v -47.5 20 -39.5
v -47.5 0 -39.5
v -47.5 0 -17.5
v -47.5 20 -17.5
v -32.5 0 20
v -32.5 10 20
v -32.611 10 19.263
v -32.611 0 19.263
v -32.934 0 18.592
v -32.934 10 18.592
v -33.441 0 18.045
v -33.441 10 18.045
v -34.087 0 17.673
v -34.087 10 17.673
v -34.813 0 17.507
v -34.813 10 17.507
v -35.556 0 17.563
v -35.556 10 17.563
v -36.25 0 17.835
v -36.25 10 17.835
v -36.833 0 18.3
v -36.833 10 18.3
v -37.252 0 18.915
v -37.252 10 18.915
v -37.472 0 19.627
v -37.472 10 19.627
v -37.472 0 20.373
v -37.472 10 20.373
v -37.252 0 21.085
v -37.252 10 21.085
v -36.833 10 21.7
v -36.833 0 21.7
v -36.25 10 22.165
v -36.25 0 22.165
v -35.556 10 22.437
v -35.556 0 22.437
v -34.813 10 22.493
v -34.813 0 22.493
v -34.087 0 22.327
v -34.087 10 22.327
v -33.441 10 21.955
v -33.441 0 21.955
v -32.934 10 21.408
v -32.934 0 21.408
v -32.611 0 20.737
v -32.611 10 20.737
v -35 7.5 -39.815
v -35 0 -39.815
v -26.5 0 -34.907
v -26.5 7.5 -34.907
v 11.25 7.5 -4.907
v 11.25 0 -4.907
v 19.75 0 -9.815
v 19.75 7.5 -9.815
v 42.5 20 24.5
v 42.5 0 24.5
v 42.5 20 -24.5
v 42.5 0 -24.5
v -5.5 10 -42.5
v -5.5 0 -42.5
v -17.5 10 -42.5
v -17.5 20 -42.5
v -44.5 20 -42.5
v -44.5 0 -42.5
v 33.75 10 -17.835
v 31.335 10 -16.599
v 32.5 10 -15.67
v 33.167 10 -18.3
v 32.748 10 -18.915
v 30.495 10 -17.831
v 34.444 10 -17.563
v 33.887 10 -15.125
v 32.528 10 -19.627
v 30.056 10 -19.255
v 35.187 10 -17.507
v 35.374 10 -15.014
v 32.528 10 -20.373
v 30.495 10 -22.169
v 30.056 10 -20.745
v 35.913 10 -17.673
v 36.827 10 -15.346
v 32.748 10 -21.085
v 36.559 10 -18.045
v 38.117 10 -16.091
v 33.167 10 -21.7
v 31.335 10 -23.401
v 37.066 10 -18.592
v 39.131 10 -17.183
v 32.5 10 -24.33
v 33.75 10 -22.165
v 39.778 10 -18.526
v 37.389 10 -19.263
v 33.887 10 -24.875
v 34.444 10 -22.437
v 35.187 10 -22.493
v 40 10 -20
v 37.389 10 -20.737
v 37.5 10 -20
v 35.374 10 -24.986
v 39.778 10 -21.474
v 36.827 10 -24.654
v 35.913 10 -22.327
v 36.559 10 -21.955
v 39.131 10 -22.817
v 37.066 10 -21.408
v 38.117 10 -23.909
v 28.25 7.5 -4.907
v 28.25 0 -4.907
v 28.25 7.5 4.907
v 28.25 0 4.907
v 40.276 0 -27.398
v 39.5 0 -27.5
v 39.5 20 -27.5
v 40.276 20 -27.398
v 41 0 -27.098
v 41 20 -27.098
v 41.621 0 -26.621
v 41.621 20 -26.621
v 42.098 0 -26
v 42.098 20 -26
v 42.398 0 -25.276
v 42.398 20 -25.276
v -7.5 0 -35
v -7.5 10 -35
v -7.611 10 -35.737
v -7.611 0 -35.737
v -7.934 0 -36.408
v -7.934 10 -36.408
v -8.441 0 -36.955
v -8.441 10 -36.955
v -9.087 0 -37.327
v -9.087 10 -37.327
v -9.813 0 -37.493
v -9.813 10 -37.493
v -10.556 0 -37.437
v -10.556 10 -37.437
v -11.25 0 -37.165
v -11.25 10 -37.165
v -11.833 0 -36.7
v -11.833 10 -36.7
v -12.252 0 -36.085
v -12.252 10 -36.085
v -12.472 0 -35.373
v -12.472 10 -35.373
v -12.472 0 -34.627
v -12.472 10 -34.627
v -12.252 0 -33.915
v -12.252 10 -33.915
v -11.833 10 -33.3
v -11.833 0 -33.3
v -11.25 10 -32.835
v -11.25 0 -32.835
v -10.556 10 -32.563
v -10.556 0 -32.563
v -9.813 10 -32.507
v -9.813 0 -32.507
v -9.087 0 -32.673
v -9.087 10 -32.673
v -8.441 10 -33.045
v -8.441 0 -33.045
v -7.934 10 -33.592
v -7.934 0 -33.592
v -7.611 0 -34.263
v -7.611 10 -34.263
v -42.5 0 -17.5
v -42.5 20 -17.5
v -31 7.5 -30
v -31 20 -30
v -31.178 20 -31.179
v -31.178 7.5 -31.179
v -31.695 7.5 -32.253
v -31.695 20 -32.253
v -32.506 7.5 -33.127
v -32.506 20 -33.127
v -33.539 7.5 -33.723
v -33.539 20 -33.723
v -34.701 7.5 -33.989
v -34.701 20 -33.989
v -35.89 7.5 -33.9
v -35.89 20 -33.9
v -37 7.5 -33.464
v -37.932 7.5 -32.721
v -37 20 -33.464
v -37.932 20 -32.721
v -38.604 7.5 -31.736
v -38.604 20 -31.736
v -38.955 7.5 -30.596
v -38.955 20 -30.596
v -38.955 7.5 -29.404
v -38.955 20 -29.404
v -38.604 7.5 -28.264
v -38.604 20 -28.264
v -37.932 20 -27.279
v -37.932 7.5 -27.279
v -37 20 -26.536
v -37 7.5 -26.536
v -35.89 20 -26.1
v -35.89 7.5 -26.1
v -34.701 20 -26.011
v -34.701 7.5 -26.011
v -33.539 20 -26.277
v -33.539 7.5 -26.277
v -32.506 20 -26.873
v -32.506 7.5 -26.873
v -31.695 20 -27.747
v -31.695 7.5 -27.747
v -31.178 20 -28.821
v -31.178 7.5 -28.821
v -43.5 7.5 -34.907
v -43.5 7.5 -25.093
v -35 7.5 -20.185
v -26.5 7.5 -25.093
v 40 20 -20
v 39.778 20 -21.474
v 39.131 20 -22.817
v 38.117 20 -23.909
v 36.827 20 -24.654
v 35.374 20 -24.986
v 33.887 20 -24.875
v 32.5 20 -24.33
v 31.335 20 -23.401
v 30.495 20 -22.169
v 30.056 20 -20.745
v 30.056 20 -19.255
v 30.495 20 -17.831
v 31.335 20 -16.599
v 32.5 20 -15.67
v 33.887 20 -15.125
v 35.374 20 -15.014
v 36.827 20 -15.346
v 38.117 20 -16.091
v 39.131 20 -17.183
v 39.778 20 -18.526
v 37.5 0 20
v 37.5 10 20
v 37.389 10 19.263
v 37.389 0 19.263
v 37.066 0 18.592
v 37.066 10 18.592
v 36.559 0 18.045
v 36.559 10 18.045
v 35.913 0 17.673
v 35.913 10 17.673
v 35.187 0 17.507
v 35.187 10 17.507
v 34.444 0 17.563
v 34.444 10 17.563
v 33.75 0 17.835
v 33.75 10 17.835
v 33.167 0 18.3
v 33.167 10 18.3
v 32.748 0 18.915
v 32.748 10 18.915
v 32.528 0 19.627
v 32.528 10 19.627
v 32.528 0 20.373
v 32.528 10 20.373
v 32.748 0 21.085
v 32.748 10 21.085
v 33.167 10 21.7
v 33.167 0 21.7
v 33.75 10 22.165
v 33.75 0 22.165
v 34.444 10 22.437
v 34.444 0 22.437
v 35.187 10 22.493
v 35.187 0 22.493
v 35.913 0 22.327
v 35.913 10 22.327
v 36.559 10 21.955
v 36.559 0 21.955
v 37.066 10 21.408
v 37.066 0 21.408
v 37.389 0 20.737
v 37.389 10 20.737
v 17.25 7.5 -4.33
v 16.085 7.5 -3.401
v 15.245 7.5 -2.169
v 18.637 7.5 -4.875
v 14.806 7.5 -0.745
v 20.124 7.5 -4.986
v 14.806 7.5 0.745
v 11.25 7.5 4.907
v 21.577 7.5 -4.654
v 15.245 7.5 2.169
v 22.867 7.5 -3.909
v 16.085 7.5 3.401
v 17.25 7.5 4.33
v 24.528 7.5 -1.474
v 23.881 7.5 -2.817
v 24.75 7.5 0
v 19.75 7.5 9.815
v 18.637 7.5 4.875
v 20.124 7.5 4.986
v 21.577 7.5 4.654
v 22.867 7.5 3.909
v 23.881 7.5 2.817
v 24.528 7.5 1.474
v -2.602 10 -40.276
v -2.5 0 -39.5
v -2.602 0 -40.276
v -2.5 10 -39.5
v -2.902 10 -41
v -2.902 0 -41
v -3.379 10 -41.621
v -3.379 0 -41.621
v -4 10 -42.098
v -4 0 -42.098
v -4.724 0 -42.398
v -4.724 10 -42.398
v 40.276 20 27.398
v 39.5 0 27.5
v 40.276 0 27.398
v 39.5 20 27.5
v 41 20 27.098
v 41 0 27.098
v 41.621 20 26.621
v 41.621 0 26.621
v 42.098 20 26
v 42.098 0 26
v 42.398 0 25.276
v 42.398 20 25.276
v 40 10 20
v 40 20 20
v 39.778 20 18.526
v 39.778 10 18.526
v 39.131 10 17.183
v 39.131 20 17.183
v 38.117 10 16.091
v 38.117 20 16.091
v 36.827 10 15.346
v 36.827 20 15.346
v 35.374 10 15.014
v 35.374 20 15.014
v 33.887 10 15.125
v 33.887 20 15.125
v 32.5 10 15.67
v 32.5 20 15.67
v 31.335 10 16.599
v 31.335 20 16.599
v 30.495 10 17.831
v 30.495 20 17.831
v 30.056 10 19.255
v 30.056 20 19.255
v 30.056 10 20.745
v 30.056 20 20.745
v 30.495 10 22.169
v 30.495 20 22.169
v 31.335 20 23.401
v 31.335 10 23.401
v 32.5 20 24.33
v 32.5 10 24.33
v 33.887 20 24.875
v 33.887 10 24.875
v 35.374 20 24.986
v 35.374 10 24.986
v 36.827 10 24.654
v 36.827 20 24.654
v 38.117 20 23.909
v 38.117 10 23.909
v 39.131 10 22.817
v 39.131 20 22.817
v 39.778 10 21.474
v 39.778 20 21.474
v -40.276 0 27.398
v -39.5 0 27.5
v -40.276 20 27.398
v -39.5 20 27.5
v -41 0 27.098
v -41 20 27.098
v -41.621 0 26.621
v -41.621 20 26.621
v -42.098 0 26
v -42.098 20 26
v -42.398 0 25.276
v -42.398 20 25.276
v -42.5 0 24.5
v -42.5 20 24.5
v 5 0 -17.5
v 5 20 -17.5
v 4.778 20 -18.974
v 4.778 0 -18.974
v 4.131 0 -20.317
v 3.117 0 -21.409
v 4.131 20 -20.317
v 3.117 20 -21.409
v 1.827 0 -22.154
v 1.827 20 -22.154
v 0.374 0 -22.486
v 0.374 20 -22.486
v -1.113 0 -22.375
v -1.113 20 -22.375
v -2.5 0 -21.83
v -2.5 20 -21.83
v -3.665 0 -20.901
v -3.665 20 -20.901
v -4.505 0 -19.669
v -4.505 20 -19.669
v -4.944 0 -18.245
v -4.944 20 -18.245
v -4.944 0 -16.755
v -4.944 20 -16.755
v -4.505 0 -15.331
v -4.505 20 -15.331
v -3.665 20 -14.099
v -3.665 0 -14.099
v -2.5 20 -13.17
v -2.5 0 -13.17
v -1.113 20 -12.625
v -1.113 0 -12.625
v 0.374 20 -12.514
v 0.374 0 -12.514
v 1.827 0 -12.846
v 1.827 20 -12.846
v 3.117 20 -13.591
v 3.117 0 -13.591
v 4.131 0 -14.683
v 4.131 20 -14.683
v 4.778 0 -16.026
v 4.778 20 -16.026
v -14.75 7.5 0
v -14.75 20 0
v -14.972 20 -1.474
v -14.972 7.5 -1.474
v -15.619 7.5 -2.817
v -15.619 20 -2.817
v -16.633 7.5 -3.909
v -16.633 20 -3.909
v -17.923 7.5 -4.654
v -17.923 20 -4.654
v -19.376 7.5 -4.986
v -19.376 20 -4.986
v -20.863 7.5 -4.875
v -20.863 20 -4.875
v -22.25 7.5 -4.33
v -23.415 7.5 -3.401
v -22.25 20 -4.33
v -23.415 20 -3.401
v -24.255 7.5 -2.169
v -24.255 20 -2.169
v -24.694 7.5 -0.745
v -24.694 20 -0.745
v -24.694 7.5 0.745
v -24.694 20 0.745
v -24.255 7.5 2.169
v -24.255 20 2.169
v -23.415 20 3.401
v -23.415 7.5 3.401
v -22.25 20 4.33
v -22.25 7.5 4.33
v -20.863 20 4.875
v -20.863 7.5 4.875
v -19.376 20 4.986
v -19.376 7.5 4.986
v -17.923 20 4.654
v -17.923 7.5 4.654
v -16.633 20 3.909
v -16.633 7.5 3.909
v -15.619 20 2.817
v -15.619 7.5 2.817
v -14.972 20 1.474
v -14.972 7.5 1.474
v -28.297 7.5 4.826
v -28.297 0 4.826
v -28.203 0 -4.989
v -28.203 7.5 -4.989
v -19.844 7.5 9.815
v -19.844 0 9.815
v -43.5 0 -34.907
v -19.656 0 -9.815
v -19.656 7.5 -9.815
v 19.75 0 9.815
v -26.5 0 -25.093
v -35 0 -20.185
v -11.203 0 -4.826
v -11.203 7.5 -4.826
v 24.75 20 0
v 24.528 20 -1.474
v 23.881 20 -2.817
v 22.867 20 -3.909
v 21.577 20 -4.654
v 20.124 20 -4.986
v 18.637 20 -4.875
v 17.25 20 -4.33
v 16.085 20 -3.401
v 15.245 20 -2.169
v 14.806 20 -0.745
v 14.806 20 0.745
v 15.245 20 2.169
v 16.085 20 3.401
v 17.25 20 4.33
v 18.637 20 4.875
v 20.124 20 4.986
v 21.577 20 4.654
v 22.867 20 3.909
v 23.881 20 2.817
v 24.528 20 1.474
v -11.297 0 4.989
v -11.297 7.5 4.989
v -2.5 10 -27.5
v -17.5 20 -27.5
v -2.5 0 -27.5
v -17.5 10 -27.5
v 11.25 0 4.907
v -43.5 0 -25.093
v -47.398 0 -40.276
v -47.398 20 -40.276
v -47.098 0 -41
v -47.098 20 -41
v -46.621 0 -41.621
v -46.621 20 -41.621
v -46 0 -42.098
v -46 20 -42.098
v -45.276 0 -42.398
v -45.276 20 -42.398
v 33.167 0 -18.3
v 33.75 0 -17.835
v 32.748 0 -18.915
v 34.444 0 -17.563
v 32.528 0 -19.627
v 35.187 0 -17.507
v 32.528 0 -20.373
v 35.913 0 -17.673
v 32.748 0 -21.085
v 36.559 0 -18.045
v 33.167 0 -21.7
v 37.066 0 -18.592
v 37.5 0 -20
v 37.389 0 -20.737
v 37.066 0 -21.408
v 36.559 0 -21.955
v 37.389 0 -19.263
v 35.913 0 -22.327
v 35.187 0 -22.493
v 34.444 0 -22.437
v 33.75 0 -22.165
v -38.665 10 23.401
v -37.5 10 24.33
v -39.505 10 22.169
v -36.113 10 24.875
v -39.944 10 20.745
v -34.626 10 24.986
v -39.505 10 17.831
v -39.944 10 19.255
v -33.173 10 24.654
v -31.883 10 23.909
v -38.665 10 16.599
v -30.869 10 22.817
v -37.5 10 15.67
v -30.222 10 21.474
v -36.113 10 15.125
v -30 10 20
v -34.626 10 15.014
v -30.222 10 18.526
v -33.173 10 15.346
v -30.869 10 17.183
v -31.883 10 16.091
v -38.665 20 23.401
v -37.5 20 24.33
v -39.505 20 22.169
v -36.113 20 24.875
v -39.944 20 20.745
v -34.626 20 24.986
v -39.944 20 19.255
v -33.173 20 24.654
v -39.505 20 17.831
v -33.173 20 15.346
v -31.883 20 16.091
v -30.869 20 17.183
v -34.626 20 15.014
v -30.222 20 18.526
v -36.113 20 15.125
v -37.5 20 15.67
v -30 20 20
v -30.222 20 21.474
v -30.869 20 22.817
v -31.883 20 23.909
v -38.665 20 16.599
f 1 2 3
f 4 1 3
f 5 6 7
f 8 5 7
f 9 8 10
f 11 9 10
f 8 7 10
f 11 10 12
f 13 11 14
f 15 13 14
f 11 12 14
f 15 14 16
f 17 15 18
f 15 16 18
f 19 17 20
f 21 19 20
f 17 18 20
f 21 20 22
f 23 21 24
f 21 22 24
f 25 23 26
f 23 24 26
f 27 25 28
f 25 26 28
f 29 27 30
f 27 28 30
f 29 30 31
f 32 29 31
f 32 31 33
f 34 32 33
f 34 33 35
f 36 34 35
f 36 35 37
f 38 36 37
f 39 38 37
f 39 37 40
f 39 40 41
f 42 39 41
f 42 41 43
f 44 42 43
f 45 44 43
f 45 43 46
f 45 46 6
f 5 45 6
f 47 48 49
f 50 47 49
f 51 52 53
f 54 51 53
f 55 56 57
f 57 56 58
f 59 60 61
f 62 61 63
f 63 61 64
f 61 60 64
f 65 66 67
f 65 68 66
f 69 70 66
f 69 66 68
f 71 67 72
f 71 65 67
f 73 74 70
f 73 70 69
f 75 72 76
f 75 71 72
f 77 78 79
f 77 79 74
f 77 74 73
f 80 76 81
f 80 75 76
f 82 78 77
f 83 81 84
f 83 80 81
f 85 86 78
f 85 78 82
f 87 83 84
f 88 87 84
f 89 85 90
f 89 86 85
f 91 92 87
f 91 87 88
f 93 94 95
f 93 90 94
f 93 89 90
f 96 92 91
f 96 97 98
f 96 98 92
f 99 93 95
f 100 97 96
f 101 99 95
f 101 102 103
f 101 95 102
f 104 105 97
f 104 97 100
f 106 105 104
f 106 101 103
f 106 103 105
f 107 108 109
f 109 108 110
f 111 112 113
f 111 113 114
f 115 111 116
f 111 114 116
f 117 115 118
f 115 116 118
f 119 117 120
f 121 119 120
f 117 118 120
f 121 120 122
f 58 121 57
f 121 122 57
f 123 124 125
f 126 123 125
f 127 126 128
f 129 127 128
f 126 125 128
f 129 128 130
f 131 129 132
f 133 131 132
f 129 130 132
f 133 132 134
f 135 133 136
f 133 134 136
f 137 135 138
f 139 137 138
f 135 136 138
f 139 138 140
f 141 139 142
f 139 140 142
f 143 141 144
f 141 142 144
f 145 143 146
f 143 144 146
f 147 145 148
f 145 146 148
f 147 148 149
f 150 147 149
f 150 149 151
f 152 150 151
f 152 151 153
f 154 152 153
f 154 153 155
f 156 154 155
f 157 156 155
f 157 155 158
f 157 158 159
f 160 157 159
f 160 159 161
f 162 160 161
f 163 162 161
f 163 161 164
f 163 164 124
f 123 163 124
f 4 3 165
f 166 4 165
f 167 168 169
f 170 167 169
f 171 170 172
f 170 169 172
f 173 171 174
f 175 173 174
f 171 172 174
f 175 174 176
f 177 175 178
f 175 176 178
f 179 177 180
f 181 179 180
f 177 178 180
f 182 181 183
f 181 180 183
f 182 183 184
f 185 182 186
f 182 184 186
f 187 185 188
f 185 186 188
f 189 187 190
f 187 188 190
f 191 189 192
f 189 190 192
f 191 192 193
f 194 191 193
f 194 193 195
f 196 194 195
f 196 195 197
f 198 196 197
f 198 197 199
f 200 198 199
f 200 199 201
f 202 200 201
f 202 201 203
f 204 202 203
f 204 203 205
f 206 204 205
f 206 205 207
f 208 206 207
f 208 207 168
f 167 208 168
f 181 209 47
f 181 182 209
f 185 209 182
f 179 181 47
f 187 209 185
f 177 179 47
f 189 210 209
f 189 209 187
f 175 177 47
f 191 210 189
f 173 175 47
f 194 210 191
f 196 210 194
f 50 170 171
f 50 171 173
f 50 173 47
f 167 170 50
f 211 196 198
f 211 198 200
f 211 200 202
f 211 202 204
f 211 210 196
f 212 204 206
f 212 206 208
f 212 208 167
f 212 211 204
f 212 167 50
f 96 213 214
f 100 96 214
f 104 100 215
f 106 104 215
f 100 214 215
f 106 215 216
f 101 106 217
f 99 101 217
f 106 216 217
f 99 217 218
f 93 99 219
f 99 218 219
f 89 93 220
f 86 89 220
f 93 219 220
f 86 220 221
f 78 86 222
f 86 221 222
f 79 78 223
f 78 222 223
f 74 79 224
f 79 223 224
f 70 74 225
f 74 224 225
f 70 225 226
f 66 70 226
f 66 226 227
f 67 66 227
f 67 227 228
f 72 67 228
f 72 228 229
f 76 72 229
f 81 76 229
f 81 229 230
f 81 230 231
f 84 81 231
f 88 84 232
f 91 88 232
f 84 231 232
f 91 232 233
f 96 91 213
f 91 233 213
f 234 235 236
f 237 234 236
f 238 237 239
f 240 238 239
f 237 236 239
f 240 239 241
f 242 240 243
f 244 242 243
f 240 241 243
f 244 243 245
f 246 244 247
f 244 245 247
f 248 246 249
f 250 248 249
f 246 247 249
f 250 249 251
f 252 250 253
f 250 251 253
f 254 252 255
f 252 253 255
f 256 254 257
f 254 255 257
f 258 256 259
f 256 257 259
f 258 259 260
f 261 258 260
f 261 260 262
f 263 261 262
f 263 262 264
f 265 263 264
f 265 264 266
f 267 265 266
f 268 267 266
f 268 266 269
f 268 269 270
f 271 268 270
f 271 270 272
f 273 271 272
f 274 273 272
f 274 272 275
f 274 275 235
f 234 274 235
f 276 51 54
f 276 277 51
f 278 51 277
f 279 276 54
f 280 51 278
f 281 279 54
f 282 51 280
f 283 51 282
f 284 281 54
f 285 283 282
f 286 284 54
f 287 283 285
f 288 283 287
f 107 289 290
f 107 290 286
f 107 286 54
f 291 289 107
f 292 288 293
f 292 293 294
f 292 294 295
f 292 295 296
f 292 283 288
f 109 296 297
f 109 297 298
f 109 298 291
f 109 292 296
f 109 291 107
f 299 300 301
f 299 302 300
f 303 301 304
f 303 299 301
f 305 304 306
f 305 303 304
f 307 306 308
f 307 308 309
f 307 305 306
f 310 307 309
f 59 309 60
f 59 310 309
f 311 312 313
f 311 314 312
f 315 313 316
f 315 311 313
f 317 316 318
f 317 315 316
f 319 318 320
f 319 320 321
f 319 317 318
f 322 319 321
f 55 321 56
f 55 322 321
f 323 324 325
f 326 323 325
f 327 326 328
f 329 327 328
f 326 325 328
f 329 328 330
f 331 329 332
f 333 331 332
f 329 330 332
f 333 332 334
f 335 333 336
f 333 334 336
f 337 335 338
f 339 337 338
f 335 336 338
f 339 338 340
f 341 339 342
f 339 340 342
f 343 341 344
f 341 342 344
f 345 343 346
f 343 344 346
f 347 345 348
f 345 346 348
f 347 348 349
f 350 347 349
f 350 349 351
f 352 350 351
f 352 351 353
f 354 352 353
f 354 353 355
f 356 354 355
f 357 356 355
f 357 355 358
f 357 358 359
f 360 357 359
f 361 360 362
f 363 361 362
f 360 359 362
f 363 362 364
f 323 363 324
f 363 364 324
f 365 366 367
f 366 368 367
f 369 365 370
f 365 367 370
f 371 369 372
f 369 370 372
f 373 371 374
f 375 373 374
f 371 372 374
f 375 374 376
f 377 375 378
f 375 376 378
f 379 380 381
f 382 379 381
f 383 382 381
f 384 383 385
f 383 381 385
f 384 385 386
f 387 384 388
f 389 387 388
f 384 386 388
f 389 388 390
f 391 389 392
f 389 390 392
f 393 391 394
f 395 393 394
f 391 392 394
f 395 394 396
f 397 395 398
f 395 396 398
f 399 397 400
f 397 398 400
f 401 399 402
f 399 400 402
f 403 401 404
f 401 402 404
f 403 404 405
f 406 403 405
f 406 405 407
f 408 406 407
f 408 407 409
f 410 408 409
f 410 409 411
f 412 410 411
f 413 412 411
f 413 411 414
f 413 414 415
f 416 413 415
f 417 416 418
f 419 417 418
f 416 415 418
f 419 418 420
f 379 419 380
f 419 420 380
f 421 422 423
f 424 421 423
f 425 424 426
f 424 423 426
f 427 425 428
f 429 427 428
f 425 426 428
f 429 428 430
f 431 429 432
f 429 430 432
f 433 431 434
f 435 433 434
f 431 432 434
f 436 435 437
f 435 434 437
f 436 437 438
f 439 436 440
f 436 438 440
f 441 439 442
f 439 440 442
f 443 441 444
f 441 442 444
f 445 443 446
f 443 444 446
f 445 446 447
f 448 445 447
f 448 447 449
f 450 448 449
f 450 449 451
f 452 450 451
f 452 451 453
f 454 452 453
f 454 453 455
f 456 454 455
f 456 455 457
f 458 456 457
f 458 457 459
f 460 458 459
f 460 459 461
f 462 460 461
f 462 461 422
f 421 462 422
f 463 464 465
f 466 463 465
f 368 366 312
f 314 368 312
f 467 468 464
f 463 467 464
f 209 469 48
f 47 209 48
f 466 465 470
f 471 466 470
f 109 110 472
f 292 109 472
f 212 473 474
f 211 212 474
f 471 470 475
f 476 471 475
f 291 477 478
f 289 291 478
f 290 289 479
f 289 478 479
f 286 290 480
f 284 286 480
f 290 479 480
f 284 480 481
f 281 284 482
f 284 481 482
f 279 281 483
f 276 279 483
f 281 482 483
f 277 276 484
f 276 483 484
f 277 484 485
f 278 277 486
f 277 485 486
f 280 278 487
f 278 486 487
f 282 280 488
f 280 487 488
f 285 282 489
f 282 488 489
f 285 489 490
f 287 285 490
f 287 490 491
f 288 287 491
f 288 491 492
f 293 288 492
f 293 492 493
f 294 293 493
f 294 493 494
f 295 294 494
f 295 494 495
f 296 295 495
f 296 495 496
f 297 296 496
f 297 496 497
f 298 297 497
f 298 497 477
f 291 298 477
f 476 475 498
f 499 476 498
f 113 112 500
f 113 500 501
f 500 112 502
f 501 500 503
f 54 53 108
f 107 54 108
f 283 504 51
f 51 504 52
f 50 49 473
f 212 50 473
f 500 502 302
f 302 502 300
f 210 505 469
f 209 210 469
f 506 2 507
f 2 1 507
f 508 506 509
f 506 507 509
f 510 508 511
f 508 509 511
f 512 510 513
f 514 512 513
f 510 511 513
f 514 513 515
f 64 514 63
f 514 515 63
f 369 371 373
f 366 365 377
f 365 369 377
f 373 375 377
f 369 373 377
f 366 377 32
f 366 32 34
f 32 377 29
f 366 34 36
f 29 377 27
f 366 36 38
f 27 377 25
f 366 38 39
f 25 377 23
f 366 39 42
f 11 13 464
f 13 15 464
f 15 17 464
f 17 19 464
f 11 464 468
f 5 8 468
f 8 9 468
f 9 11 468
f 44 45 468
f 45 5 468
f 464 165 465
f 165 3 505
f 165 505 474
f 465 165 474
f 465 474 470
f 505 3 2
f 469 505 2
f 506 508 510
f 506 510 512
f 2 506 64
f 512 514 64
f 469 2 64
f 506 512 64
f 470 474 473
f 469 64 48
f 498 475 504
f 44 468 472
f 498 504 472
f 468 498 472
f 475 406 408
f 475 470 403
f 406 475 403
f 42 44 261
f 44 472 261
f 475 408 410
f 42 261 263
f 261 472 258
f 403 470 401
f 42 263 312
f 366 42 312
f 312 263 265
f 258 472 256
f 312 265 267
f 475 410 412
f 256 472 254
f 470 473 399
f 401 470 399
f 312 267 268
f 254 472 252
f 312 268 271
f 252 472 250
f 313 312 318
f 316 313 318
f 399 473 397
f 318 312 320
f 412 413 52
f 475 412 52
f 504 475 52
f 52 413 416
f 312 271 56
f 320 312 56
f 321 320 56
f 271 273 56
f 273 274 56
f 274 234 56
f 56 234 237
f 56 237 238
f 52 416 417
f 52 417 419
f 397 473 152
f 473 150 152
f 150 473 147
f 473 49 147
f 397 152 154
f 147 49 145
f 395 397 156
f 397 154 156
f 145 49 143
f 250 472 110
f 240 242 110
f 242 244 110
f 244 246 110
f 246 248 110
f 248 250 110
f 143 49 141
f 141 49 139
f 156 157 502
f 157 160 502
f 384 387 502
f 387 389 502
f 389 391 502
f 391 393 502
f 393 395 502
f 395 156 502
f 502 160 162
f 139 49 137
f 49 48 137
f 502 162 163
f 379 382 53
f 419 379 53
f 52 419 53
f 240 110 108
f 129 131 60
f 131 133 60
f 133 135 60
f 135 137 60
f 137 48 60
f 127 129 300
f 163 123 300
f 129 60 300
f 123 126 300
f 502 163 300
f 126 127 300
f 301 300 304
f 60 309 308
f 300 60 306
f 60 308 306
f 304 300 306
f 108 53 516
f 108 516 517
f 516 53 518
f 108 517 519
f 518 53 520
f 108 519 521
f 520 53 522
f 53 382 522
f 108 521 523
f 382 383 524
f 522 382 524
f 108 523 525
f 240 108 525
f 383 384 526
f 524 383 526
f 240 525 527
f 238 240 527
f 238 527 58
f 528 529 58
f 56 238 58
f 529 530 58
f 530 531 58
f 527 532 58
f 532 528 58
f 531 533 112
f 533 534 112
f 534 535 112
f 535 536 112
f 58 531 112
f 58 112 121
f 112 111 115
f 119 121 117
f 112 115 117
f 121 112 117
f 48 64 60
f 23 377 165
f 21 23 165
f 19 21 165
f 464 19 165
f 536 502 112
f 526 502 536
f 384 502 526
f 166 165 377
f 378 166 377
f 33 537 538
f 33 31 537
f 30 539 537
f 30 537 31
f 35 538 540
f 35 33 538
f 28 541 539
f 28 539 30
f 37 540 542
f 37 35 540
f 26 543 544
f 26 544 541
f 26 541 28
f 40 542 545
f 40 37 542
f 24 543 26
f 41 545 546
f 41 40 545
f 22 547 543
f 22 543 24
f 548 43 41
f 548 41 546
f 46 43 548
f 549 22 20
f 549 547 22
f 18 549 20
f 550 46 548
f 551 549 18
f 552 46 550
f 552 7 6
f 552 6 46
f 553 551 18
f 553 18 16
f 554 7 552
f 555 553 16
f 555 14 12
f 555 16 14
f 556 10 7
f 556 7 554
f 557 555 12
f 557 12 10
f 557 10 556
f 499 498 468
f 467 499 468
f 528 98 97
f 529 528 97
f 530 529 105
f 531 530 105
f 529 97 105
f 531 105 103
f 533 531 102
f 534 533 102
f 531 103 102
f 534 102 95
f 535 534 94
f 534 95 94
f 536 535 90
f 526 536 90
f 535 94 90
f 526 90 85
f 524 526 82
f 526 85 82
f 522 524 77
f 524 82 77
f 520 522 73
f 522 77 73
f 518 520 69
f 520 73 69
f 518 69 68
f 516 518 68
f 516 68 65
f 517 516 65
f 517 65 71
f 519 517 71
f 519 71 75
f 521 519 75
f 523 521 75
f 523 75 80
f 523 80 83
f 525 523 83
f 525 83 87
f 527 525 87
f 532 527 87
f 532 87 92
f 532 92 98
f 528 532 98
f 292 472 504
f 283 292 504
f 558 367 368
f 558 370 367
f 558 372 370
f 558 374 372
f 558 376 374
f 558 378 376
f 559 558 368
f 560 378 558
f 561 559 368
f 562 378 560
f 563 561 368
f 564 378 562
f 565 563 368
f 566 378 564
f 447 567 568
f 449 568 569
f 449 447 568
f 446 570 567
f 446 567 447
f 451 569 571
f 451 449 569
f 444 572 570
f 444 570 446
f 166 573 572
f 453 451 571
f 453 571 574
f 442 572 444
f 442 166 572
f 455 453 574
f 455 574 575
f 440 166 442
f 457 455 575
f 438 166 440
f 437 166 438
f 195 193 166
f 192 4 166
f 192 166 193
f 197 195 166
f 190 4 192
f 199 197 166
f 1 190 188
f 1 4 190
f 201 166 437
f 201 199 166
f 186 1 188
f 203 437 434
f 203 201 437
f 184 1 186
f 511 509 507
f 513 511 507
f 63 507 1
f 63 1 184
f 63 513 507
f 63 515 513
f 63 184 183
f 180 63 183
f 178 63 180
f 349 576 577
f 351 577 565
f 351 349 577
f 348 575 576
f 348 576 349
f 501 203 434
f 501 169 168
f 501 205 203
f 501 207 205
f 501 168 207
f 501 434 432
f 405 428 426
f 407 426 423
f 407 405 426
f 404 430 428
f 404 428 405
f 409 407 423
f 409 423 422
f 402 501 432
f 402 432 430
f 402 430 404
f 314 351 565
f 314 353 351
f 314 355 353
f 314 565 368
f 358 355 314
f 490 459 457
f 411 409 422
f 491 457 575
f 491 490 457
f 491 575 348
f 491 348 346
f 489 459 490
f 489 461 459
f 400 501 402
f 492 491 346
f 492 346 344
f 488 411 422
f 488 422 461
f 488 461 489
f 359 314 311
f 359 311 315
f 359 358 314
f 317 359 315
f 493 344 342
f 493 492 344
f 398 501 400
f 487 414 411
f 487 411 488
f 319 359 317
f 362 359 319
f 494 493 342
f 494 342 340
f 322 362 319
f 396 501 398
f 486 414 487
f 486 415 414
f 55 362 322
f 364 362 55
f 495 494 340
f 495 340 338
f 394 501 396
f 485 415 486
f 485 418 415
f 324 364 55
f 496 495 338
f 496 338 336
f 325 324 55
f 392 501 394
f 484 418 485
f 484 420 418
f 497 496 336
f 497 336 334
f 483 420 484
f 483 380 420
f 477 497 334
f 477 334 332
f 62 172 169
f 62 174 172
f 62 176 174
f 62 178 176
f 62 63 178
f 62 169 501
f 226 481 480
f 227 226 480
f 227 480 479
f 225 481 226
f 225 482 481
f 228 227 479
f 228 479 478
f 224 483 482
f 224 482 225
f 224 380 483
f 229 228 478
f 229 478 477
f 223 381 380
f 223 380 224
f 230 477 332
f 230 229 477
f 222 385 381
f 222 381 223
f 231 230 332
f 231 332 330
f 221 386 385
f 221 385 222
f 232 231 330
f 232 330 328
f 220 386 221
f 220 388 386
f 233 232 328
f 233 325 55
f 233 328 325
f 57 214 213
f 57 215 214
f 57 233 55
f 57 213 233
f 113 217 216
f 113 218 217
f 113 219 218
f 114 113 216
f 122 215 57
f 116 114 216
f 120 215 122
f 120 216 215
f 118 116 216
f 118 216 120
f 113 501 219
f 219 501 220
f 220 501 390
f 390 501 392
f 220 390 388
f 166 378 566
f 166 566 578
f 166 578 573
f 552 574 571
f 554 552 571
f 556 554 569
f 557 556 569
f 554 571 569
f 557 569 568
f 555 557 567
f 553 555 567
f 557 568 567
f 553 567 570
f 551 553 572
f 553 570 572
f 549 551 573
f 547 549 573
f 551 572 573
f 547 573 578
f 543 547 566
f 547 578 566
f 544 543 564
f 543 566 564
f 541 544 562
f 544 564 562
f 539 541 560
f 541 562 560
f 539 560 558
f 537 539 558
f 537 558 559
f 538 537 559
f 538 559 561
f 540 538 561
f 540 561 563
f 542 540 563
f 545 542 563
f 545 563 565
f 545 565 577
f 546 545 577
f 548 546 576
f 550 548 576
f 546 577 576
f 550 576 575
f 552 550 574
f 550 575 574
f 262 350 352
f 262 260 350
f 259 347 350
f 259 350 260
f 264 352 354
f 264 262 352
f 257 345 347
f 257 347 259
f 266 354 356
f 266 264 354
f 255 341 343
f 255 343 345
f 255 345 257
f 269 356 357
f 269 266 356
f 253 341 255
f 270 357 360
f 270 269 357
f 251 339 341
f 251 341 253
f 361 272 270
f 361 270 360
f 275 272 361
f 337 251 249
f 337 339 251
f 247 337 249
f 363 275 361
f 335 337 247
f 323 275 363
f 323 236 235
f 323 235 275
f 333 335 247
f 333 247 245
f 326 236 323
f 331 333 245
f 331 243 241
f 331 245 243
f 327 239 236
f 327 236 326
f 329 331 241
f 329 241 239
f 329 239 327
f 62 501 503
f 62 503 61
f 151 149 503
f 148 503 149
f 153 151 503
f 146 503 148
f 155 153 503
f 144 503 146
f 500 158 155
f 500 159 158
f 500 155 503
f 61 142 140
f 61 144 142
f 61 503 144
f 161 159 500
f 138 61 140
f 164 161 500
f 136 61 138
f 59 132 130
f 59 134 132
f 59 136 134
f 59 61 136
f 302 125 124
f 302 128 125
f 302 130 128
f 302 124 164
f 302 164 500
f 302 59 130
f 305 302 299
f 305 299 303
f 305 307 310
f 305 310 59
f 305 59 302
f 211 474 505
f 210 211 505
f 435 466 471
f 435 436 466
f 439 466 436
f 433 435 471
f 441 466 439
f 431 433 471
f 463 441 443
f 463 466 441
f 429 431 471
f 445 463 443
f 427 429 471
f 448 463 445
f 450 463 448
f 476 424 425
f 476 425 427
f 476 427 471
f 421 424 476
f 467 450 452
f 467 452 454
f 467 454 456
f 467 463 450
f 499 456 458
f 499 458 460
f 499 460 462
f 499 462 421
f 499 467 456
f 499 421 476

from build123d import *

# Parameters (mm, degrees)
SALIENTE_EXTRUIR1_DEPTH = 20
CROQUIS2_R              = 2.5
CROQUIS2_R_2            = 5
CORTAR_EXTRUIR1_DEPTH   = 20
CROQUIS3_R              = 4
CROQUIS3_R_2            = 5
CORTAR_EXTRUIR2_DEPTH   = 20
CORTAR_EXTRUIR3_DEPTH   = 7.5
CROQUIS5_R              = 5
CROQUIS5_W              = 15
CROQUIS5_H              = 15
CORTAR_EXTRUIR4_DEPTH   = 10
REDONDEO1_R             = 3


with BuildPart() as part:
    # Croquis1 → Saliente-Extruir1 (new body)
    with BuildSketch(Plane(origin=(0, 0, 0), x_dir=(1, 0, 0), z_dir=(0, 1, 0))):
        Polygon((-2.5, 27.5), (-2.5, 42.5), (-47.5, 42.5), (-47.5, 17.5), (-42.5, 17.5), (-42.5, -27.5), (42.5, -27.5), (42.5, 27.5), align=None)
    extrude(amount=SALIENTE_EXTRUIR1_DEPTH)

    # Croquis2 → Cortar-Extruir1 (cut)
    with BuildSketch(Plane(origin=(0, 20, 0), x_dir=(1, 0, 0), z_dir=(0, 1, 0))):
        with Locations((35, 20)):
            Circle(CROQUIS2_R)
        with Locations((35, -20)):
            Circle(CROQUIS2_R)
        with Locations((-35, -20)):
            Circle(CROQUIS2_R)
        with Locations((-10, 35)):
            Circle(CROQUIS2_R)
        with Locations((-19.75, 0)):
            Circle(CROQUIS2_R_2)
        with Locations((19.75, 0)):
            Circle(CROQUIS2_R_2)
    extrude(amount=-CORTAR_EXTRUIR1_DEPTH, mode=Mode.SUBTRACT)

    # Croquis3 → Cortar-Extruir2 (cut)
    with BuildSketch(Plane(origin=(0, 20, 0), x_dir=(1, 0, 0), z_dir=(0, 1, 0))):
        with Locations((-35, 30)):
            Circle(CROQUIS3_R)
        with Locations((0, 17.5)):
            Circle(CROQUIS3_R_2)
    extrude(amount=-CORTAR_EXTRUIR2_DEPTH, mode=Mode.SUBTRACT)

    # Croquis4 → Cortar-Extruir3 (cut)
    with BuildSketch(Plane.XZ):
        Polygon((19.75, -9.814954576), (28.25, -4.907477288), (28.25, 4.907477288), (19.75, 9.814954576), (11.25, 4.907477288), (11.25, -4.907477288), align=None)
        Polygon((-19.655862416, -9.814503118), (-11.203322183, -4.82572602), (-11.297459766, 4.988777098), (-19.844137584, 9.814503118), (-28.296677817, 4.82572602), (-28.202540234, -4.988777098), align=None)
        Polygon((-35, -39.814954576), (-26.5, -34.907477288), (-26.5, -25.092522712), (-35, -20.185045424), (-43.5, -25.092522712), (-43.5, -34.907477288), align=None)
    extrude(amount=-CORTAR_EXTRUIR3_DEPTH, mode=Mode.SUBTRACT)

    # Croquis5 → Cortar-Extruir4 (cut)
    with BuildSketch(Plane(origin=(0, 20, 0), x_dir=(1, 0, 0), z_dir=(0, 1, 0))):
        with Locations((-35, -20)):
            Circle(CROQUIS5_R)
        with Locations((35, -20)):
            Circle(CROQUIS5_R)
        with Locations((35, 20)):
            Circle(CROQUIS5_R)
        with Locations((-10, 35)):
            Rectangle(CROQUIS5_W, CROQUIS5_H)
    extrude(amount=-CORTAR_EXTRUIR4_DEPTH, mode=Mode.SUBTRACT)

    # Redondeo1
    redondeo1_edges = [part.edges().sort_by_distance(p)[0] for p in [
        (-2.5, 5, -42.5),
        (42.5, 10, 27.5),
        (-42.5, 10, 27.5),
        (-47.5, 10, -42.5),
        (42.5, 10, -27.5),
    ]]
    fillet(redondeo1_edges, radius=REDONDEO1_R)


solid = part.part
